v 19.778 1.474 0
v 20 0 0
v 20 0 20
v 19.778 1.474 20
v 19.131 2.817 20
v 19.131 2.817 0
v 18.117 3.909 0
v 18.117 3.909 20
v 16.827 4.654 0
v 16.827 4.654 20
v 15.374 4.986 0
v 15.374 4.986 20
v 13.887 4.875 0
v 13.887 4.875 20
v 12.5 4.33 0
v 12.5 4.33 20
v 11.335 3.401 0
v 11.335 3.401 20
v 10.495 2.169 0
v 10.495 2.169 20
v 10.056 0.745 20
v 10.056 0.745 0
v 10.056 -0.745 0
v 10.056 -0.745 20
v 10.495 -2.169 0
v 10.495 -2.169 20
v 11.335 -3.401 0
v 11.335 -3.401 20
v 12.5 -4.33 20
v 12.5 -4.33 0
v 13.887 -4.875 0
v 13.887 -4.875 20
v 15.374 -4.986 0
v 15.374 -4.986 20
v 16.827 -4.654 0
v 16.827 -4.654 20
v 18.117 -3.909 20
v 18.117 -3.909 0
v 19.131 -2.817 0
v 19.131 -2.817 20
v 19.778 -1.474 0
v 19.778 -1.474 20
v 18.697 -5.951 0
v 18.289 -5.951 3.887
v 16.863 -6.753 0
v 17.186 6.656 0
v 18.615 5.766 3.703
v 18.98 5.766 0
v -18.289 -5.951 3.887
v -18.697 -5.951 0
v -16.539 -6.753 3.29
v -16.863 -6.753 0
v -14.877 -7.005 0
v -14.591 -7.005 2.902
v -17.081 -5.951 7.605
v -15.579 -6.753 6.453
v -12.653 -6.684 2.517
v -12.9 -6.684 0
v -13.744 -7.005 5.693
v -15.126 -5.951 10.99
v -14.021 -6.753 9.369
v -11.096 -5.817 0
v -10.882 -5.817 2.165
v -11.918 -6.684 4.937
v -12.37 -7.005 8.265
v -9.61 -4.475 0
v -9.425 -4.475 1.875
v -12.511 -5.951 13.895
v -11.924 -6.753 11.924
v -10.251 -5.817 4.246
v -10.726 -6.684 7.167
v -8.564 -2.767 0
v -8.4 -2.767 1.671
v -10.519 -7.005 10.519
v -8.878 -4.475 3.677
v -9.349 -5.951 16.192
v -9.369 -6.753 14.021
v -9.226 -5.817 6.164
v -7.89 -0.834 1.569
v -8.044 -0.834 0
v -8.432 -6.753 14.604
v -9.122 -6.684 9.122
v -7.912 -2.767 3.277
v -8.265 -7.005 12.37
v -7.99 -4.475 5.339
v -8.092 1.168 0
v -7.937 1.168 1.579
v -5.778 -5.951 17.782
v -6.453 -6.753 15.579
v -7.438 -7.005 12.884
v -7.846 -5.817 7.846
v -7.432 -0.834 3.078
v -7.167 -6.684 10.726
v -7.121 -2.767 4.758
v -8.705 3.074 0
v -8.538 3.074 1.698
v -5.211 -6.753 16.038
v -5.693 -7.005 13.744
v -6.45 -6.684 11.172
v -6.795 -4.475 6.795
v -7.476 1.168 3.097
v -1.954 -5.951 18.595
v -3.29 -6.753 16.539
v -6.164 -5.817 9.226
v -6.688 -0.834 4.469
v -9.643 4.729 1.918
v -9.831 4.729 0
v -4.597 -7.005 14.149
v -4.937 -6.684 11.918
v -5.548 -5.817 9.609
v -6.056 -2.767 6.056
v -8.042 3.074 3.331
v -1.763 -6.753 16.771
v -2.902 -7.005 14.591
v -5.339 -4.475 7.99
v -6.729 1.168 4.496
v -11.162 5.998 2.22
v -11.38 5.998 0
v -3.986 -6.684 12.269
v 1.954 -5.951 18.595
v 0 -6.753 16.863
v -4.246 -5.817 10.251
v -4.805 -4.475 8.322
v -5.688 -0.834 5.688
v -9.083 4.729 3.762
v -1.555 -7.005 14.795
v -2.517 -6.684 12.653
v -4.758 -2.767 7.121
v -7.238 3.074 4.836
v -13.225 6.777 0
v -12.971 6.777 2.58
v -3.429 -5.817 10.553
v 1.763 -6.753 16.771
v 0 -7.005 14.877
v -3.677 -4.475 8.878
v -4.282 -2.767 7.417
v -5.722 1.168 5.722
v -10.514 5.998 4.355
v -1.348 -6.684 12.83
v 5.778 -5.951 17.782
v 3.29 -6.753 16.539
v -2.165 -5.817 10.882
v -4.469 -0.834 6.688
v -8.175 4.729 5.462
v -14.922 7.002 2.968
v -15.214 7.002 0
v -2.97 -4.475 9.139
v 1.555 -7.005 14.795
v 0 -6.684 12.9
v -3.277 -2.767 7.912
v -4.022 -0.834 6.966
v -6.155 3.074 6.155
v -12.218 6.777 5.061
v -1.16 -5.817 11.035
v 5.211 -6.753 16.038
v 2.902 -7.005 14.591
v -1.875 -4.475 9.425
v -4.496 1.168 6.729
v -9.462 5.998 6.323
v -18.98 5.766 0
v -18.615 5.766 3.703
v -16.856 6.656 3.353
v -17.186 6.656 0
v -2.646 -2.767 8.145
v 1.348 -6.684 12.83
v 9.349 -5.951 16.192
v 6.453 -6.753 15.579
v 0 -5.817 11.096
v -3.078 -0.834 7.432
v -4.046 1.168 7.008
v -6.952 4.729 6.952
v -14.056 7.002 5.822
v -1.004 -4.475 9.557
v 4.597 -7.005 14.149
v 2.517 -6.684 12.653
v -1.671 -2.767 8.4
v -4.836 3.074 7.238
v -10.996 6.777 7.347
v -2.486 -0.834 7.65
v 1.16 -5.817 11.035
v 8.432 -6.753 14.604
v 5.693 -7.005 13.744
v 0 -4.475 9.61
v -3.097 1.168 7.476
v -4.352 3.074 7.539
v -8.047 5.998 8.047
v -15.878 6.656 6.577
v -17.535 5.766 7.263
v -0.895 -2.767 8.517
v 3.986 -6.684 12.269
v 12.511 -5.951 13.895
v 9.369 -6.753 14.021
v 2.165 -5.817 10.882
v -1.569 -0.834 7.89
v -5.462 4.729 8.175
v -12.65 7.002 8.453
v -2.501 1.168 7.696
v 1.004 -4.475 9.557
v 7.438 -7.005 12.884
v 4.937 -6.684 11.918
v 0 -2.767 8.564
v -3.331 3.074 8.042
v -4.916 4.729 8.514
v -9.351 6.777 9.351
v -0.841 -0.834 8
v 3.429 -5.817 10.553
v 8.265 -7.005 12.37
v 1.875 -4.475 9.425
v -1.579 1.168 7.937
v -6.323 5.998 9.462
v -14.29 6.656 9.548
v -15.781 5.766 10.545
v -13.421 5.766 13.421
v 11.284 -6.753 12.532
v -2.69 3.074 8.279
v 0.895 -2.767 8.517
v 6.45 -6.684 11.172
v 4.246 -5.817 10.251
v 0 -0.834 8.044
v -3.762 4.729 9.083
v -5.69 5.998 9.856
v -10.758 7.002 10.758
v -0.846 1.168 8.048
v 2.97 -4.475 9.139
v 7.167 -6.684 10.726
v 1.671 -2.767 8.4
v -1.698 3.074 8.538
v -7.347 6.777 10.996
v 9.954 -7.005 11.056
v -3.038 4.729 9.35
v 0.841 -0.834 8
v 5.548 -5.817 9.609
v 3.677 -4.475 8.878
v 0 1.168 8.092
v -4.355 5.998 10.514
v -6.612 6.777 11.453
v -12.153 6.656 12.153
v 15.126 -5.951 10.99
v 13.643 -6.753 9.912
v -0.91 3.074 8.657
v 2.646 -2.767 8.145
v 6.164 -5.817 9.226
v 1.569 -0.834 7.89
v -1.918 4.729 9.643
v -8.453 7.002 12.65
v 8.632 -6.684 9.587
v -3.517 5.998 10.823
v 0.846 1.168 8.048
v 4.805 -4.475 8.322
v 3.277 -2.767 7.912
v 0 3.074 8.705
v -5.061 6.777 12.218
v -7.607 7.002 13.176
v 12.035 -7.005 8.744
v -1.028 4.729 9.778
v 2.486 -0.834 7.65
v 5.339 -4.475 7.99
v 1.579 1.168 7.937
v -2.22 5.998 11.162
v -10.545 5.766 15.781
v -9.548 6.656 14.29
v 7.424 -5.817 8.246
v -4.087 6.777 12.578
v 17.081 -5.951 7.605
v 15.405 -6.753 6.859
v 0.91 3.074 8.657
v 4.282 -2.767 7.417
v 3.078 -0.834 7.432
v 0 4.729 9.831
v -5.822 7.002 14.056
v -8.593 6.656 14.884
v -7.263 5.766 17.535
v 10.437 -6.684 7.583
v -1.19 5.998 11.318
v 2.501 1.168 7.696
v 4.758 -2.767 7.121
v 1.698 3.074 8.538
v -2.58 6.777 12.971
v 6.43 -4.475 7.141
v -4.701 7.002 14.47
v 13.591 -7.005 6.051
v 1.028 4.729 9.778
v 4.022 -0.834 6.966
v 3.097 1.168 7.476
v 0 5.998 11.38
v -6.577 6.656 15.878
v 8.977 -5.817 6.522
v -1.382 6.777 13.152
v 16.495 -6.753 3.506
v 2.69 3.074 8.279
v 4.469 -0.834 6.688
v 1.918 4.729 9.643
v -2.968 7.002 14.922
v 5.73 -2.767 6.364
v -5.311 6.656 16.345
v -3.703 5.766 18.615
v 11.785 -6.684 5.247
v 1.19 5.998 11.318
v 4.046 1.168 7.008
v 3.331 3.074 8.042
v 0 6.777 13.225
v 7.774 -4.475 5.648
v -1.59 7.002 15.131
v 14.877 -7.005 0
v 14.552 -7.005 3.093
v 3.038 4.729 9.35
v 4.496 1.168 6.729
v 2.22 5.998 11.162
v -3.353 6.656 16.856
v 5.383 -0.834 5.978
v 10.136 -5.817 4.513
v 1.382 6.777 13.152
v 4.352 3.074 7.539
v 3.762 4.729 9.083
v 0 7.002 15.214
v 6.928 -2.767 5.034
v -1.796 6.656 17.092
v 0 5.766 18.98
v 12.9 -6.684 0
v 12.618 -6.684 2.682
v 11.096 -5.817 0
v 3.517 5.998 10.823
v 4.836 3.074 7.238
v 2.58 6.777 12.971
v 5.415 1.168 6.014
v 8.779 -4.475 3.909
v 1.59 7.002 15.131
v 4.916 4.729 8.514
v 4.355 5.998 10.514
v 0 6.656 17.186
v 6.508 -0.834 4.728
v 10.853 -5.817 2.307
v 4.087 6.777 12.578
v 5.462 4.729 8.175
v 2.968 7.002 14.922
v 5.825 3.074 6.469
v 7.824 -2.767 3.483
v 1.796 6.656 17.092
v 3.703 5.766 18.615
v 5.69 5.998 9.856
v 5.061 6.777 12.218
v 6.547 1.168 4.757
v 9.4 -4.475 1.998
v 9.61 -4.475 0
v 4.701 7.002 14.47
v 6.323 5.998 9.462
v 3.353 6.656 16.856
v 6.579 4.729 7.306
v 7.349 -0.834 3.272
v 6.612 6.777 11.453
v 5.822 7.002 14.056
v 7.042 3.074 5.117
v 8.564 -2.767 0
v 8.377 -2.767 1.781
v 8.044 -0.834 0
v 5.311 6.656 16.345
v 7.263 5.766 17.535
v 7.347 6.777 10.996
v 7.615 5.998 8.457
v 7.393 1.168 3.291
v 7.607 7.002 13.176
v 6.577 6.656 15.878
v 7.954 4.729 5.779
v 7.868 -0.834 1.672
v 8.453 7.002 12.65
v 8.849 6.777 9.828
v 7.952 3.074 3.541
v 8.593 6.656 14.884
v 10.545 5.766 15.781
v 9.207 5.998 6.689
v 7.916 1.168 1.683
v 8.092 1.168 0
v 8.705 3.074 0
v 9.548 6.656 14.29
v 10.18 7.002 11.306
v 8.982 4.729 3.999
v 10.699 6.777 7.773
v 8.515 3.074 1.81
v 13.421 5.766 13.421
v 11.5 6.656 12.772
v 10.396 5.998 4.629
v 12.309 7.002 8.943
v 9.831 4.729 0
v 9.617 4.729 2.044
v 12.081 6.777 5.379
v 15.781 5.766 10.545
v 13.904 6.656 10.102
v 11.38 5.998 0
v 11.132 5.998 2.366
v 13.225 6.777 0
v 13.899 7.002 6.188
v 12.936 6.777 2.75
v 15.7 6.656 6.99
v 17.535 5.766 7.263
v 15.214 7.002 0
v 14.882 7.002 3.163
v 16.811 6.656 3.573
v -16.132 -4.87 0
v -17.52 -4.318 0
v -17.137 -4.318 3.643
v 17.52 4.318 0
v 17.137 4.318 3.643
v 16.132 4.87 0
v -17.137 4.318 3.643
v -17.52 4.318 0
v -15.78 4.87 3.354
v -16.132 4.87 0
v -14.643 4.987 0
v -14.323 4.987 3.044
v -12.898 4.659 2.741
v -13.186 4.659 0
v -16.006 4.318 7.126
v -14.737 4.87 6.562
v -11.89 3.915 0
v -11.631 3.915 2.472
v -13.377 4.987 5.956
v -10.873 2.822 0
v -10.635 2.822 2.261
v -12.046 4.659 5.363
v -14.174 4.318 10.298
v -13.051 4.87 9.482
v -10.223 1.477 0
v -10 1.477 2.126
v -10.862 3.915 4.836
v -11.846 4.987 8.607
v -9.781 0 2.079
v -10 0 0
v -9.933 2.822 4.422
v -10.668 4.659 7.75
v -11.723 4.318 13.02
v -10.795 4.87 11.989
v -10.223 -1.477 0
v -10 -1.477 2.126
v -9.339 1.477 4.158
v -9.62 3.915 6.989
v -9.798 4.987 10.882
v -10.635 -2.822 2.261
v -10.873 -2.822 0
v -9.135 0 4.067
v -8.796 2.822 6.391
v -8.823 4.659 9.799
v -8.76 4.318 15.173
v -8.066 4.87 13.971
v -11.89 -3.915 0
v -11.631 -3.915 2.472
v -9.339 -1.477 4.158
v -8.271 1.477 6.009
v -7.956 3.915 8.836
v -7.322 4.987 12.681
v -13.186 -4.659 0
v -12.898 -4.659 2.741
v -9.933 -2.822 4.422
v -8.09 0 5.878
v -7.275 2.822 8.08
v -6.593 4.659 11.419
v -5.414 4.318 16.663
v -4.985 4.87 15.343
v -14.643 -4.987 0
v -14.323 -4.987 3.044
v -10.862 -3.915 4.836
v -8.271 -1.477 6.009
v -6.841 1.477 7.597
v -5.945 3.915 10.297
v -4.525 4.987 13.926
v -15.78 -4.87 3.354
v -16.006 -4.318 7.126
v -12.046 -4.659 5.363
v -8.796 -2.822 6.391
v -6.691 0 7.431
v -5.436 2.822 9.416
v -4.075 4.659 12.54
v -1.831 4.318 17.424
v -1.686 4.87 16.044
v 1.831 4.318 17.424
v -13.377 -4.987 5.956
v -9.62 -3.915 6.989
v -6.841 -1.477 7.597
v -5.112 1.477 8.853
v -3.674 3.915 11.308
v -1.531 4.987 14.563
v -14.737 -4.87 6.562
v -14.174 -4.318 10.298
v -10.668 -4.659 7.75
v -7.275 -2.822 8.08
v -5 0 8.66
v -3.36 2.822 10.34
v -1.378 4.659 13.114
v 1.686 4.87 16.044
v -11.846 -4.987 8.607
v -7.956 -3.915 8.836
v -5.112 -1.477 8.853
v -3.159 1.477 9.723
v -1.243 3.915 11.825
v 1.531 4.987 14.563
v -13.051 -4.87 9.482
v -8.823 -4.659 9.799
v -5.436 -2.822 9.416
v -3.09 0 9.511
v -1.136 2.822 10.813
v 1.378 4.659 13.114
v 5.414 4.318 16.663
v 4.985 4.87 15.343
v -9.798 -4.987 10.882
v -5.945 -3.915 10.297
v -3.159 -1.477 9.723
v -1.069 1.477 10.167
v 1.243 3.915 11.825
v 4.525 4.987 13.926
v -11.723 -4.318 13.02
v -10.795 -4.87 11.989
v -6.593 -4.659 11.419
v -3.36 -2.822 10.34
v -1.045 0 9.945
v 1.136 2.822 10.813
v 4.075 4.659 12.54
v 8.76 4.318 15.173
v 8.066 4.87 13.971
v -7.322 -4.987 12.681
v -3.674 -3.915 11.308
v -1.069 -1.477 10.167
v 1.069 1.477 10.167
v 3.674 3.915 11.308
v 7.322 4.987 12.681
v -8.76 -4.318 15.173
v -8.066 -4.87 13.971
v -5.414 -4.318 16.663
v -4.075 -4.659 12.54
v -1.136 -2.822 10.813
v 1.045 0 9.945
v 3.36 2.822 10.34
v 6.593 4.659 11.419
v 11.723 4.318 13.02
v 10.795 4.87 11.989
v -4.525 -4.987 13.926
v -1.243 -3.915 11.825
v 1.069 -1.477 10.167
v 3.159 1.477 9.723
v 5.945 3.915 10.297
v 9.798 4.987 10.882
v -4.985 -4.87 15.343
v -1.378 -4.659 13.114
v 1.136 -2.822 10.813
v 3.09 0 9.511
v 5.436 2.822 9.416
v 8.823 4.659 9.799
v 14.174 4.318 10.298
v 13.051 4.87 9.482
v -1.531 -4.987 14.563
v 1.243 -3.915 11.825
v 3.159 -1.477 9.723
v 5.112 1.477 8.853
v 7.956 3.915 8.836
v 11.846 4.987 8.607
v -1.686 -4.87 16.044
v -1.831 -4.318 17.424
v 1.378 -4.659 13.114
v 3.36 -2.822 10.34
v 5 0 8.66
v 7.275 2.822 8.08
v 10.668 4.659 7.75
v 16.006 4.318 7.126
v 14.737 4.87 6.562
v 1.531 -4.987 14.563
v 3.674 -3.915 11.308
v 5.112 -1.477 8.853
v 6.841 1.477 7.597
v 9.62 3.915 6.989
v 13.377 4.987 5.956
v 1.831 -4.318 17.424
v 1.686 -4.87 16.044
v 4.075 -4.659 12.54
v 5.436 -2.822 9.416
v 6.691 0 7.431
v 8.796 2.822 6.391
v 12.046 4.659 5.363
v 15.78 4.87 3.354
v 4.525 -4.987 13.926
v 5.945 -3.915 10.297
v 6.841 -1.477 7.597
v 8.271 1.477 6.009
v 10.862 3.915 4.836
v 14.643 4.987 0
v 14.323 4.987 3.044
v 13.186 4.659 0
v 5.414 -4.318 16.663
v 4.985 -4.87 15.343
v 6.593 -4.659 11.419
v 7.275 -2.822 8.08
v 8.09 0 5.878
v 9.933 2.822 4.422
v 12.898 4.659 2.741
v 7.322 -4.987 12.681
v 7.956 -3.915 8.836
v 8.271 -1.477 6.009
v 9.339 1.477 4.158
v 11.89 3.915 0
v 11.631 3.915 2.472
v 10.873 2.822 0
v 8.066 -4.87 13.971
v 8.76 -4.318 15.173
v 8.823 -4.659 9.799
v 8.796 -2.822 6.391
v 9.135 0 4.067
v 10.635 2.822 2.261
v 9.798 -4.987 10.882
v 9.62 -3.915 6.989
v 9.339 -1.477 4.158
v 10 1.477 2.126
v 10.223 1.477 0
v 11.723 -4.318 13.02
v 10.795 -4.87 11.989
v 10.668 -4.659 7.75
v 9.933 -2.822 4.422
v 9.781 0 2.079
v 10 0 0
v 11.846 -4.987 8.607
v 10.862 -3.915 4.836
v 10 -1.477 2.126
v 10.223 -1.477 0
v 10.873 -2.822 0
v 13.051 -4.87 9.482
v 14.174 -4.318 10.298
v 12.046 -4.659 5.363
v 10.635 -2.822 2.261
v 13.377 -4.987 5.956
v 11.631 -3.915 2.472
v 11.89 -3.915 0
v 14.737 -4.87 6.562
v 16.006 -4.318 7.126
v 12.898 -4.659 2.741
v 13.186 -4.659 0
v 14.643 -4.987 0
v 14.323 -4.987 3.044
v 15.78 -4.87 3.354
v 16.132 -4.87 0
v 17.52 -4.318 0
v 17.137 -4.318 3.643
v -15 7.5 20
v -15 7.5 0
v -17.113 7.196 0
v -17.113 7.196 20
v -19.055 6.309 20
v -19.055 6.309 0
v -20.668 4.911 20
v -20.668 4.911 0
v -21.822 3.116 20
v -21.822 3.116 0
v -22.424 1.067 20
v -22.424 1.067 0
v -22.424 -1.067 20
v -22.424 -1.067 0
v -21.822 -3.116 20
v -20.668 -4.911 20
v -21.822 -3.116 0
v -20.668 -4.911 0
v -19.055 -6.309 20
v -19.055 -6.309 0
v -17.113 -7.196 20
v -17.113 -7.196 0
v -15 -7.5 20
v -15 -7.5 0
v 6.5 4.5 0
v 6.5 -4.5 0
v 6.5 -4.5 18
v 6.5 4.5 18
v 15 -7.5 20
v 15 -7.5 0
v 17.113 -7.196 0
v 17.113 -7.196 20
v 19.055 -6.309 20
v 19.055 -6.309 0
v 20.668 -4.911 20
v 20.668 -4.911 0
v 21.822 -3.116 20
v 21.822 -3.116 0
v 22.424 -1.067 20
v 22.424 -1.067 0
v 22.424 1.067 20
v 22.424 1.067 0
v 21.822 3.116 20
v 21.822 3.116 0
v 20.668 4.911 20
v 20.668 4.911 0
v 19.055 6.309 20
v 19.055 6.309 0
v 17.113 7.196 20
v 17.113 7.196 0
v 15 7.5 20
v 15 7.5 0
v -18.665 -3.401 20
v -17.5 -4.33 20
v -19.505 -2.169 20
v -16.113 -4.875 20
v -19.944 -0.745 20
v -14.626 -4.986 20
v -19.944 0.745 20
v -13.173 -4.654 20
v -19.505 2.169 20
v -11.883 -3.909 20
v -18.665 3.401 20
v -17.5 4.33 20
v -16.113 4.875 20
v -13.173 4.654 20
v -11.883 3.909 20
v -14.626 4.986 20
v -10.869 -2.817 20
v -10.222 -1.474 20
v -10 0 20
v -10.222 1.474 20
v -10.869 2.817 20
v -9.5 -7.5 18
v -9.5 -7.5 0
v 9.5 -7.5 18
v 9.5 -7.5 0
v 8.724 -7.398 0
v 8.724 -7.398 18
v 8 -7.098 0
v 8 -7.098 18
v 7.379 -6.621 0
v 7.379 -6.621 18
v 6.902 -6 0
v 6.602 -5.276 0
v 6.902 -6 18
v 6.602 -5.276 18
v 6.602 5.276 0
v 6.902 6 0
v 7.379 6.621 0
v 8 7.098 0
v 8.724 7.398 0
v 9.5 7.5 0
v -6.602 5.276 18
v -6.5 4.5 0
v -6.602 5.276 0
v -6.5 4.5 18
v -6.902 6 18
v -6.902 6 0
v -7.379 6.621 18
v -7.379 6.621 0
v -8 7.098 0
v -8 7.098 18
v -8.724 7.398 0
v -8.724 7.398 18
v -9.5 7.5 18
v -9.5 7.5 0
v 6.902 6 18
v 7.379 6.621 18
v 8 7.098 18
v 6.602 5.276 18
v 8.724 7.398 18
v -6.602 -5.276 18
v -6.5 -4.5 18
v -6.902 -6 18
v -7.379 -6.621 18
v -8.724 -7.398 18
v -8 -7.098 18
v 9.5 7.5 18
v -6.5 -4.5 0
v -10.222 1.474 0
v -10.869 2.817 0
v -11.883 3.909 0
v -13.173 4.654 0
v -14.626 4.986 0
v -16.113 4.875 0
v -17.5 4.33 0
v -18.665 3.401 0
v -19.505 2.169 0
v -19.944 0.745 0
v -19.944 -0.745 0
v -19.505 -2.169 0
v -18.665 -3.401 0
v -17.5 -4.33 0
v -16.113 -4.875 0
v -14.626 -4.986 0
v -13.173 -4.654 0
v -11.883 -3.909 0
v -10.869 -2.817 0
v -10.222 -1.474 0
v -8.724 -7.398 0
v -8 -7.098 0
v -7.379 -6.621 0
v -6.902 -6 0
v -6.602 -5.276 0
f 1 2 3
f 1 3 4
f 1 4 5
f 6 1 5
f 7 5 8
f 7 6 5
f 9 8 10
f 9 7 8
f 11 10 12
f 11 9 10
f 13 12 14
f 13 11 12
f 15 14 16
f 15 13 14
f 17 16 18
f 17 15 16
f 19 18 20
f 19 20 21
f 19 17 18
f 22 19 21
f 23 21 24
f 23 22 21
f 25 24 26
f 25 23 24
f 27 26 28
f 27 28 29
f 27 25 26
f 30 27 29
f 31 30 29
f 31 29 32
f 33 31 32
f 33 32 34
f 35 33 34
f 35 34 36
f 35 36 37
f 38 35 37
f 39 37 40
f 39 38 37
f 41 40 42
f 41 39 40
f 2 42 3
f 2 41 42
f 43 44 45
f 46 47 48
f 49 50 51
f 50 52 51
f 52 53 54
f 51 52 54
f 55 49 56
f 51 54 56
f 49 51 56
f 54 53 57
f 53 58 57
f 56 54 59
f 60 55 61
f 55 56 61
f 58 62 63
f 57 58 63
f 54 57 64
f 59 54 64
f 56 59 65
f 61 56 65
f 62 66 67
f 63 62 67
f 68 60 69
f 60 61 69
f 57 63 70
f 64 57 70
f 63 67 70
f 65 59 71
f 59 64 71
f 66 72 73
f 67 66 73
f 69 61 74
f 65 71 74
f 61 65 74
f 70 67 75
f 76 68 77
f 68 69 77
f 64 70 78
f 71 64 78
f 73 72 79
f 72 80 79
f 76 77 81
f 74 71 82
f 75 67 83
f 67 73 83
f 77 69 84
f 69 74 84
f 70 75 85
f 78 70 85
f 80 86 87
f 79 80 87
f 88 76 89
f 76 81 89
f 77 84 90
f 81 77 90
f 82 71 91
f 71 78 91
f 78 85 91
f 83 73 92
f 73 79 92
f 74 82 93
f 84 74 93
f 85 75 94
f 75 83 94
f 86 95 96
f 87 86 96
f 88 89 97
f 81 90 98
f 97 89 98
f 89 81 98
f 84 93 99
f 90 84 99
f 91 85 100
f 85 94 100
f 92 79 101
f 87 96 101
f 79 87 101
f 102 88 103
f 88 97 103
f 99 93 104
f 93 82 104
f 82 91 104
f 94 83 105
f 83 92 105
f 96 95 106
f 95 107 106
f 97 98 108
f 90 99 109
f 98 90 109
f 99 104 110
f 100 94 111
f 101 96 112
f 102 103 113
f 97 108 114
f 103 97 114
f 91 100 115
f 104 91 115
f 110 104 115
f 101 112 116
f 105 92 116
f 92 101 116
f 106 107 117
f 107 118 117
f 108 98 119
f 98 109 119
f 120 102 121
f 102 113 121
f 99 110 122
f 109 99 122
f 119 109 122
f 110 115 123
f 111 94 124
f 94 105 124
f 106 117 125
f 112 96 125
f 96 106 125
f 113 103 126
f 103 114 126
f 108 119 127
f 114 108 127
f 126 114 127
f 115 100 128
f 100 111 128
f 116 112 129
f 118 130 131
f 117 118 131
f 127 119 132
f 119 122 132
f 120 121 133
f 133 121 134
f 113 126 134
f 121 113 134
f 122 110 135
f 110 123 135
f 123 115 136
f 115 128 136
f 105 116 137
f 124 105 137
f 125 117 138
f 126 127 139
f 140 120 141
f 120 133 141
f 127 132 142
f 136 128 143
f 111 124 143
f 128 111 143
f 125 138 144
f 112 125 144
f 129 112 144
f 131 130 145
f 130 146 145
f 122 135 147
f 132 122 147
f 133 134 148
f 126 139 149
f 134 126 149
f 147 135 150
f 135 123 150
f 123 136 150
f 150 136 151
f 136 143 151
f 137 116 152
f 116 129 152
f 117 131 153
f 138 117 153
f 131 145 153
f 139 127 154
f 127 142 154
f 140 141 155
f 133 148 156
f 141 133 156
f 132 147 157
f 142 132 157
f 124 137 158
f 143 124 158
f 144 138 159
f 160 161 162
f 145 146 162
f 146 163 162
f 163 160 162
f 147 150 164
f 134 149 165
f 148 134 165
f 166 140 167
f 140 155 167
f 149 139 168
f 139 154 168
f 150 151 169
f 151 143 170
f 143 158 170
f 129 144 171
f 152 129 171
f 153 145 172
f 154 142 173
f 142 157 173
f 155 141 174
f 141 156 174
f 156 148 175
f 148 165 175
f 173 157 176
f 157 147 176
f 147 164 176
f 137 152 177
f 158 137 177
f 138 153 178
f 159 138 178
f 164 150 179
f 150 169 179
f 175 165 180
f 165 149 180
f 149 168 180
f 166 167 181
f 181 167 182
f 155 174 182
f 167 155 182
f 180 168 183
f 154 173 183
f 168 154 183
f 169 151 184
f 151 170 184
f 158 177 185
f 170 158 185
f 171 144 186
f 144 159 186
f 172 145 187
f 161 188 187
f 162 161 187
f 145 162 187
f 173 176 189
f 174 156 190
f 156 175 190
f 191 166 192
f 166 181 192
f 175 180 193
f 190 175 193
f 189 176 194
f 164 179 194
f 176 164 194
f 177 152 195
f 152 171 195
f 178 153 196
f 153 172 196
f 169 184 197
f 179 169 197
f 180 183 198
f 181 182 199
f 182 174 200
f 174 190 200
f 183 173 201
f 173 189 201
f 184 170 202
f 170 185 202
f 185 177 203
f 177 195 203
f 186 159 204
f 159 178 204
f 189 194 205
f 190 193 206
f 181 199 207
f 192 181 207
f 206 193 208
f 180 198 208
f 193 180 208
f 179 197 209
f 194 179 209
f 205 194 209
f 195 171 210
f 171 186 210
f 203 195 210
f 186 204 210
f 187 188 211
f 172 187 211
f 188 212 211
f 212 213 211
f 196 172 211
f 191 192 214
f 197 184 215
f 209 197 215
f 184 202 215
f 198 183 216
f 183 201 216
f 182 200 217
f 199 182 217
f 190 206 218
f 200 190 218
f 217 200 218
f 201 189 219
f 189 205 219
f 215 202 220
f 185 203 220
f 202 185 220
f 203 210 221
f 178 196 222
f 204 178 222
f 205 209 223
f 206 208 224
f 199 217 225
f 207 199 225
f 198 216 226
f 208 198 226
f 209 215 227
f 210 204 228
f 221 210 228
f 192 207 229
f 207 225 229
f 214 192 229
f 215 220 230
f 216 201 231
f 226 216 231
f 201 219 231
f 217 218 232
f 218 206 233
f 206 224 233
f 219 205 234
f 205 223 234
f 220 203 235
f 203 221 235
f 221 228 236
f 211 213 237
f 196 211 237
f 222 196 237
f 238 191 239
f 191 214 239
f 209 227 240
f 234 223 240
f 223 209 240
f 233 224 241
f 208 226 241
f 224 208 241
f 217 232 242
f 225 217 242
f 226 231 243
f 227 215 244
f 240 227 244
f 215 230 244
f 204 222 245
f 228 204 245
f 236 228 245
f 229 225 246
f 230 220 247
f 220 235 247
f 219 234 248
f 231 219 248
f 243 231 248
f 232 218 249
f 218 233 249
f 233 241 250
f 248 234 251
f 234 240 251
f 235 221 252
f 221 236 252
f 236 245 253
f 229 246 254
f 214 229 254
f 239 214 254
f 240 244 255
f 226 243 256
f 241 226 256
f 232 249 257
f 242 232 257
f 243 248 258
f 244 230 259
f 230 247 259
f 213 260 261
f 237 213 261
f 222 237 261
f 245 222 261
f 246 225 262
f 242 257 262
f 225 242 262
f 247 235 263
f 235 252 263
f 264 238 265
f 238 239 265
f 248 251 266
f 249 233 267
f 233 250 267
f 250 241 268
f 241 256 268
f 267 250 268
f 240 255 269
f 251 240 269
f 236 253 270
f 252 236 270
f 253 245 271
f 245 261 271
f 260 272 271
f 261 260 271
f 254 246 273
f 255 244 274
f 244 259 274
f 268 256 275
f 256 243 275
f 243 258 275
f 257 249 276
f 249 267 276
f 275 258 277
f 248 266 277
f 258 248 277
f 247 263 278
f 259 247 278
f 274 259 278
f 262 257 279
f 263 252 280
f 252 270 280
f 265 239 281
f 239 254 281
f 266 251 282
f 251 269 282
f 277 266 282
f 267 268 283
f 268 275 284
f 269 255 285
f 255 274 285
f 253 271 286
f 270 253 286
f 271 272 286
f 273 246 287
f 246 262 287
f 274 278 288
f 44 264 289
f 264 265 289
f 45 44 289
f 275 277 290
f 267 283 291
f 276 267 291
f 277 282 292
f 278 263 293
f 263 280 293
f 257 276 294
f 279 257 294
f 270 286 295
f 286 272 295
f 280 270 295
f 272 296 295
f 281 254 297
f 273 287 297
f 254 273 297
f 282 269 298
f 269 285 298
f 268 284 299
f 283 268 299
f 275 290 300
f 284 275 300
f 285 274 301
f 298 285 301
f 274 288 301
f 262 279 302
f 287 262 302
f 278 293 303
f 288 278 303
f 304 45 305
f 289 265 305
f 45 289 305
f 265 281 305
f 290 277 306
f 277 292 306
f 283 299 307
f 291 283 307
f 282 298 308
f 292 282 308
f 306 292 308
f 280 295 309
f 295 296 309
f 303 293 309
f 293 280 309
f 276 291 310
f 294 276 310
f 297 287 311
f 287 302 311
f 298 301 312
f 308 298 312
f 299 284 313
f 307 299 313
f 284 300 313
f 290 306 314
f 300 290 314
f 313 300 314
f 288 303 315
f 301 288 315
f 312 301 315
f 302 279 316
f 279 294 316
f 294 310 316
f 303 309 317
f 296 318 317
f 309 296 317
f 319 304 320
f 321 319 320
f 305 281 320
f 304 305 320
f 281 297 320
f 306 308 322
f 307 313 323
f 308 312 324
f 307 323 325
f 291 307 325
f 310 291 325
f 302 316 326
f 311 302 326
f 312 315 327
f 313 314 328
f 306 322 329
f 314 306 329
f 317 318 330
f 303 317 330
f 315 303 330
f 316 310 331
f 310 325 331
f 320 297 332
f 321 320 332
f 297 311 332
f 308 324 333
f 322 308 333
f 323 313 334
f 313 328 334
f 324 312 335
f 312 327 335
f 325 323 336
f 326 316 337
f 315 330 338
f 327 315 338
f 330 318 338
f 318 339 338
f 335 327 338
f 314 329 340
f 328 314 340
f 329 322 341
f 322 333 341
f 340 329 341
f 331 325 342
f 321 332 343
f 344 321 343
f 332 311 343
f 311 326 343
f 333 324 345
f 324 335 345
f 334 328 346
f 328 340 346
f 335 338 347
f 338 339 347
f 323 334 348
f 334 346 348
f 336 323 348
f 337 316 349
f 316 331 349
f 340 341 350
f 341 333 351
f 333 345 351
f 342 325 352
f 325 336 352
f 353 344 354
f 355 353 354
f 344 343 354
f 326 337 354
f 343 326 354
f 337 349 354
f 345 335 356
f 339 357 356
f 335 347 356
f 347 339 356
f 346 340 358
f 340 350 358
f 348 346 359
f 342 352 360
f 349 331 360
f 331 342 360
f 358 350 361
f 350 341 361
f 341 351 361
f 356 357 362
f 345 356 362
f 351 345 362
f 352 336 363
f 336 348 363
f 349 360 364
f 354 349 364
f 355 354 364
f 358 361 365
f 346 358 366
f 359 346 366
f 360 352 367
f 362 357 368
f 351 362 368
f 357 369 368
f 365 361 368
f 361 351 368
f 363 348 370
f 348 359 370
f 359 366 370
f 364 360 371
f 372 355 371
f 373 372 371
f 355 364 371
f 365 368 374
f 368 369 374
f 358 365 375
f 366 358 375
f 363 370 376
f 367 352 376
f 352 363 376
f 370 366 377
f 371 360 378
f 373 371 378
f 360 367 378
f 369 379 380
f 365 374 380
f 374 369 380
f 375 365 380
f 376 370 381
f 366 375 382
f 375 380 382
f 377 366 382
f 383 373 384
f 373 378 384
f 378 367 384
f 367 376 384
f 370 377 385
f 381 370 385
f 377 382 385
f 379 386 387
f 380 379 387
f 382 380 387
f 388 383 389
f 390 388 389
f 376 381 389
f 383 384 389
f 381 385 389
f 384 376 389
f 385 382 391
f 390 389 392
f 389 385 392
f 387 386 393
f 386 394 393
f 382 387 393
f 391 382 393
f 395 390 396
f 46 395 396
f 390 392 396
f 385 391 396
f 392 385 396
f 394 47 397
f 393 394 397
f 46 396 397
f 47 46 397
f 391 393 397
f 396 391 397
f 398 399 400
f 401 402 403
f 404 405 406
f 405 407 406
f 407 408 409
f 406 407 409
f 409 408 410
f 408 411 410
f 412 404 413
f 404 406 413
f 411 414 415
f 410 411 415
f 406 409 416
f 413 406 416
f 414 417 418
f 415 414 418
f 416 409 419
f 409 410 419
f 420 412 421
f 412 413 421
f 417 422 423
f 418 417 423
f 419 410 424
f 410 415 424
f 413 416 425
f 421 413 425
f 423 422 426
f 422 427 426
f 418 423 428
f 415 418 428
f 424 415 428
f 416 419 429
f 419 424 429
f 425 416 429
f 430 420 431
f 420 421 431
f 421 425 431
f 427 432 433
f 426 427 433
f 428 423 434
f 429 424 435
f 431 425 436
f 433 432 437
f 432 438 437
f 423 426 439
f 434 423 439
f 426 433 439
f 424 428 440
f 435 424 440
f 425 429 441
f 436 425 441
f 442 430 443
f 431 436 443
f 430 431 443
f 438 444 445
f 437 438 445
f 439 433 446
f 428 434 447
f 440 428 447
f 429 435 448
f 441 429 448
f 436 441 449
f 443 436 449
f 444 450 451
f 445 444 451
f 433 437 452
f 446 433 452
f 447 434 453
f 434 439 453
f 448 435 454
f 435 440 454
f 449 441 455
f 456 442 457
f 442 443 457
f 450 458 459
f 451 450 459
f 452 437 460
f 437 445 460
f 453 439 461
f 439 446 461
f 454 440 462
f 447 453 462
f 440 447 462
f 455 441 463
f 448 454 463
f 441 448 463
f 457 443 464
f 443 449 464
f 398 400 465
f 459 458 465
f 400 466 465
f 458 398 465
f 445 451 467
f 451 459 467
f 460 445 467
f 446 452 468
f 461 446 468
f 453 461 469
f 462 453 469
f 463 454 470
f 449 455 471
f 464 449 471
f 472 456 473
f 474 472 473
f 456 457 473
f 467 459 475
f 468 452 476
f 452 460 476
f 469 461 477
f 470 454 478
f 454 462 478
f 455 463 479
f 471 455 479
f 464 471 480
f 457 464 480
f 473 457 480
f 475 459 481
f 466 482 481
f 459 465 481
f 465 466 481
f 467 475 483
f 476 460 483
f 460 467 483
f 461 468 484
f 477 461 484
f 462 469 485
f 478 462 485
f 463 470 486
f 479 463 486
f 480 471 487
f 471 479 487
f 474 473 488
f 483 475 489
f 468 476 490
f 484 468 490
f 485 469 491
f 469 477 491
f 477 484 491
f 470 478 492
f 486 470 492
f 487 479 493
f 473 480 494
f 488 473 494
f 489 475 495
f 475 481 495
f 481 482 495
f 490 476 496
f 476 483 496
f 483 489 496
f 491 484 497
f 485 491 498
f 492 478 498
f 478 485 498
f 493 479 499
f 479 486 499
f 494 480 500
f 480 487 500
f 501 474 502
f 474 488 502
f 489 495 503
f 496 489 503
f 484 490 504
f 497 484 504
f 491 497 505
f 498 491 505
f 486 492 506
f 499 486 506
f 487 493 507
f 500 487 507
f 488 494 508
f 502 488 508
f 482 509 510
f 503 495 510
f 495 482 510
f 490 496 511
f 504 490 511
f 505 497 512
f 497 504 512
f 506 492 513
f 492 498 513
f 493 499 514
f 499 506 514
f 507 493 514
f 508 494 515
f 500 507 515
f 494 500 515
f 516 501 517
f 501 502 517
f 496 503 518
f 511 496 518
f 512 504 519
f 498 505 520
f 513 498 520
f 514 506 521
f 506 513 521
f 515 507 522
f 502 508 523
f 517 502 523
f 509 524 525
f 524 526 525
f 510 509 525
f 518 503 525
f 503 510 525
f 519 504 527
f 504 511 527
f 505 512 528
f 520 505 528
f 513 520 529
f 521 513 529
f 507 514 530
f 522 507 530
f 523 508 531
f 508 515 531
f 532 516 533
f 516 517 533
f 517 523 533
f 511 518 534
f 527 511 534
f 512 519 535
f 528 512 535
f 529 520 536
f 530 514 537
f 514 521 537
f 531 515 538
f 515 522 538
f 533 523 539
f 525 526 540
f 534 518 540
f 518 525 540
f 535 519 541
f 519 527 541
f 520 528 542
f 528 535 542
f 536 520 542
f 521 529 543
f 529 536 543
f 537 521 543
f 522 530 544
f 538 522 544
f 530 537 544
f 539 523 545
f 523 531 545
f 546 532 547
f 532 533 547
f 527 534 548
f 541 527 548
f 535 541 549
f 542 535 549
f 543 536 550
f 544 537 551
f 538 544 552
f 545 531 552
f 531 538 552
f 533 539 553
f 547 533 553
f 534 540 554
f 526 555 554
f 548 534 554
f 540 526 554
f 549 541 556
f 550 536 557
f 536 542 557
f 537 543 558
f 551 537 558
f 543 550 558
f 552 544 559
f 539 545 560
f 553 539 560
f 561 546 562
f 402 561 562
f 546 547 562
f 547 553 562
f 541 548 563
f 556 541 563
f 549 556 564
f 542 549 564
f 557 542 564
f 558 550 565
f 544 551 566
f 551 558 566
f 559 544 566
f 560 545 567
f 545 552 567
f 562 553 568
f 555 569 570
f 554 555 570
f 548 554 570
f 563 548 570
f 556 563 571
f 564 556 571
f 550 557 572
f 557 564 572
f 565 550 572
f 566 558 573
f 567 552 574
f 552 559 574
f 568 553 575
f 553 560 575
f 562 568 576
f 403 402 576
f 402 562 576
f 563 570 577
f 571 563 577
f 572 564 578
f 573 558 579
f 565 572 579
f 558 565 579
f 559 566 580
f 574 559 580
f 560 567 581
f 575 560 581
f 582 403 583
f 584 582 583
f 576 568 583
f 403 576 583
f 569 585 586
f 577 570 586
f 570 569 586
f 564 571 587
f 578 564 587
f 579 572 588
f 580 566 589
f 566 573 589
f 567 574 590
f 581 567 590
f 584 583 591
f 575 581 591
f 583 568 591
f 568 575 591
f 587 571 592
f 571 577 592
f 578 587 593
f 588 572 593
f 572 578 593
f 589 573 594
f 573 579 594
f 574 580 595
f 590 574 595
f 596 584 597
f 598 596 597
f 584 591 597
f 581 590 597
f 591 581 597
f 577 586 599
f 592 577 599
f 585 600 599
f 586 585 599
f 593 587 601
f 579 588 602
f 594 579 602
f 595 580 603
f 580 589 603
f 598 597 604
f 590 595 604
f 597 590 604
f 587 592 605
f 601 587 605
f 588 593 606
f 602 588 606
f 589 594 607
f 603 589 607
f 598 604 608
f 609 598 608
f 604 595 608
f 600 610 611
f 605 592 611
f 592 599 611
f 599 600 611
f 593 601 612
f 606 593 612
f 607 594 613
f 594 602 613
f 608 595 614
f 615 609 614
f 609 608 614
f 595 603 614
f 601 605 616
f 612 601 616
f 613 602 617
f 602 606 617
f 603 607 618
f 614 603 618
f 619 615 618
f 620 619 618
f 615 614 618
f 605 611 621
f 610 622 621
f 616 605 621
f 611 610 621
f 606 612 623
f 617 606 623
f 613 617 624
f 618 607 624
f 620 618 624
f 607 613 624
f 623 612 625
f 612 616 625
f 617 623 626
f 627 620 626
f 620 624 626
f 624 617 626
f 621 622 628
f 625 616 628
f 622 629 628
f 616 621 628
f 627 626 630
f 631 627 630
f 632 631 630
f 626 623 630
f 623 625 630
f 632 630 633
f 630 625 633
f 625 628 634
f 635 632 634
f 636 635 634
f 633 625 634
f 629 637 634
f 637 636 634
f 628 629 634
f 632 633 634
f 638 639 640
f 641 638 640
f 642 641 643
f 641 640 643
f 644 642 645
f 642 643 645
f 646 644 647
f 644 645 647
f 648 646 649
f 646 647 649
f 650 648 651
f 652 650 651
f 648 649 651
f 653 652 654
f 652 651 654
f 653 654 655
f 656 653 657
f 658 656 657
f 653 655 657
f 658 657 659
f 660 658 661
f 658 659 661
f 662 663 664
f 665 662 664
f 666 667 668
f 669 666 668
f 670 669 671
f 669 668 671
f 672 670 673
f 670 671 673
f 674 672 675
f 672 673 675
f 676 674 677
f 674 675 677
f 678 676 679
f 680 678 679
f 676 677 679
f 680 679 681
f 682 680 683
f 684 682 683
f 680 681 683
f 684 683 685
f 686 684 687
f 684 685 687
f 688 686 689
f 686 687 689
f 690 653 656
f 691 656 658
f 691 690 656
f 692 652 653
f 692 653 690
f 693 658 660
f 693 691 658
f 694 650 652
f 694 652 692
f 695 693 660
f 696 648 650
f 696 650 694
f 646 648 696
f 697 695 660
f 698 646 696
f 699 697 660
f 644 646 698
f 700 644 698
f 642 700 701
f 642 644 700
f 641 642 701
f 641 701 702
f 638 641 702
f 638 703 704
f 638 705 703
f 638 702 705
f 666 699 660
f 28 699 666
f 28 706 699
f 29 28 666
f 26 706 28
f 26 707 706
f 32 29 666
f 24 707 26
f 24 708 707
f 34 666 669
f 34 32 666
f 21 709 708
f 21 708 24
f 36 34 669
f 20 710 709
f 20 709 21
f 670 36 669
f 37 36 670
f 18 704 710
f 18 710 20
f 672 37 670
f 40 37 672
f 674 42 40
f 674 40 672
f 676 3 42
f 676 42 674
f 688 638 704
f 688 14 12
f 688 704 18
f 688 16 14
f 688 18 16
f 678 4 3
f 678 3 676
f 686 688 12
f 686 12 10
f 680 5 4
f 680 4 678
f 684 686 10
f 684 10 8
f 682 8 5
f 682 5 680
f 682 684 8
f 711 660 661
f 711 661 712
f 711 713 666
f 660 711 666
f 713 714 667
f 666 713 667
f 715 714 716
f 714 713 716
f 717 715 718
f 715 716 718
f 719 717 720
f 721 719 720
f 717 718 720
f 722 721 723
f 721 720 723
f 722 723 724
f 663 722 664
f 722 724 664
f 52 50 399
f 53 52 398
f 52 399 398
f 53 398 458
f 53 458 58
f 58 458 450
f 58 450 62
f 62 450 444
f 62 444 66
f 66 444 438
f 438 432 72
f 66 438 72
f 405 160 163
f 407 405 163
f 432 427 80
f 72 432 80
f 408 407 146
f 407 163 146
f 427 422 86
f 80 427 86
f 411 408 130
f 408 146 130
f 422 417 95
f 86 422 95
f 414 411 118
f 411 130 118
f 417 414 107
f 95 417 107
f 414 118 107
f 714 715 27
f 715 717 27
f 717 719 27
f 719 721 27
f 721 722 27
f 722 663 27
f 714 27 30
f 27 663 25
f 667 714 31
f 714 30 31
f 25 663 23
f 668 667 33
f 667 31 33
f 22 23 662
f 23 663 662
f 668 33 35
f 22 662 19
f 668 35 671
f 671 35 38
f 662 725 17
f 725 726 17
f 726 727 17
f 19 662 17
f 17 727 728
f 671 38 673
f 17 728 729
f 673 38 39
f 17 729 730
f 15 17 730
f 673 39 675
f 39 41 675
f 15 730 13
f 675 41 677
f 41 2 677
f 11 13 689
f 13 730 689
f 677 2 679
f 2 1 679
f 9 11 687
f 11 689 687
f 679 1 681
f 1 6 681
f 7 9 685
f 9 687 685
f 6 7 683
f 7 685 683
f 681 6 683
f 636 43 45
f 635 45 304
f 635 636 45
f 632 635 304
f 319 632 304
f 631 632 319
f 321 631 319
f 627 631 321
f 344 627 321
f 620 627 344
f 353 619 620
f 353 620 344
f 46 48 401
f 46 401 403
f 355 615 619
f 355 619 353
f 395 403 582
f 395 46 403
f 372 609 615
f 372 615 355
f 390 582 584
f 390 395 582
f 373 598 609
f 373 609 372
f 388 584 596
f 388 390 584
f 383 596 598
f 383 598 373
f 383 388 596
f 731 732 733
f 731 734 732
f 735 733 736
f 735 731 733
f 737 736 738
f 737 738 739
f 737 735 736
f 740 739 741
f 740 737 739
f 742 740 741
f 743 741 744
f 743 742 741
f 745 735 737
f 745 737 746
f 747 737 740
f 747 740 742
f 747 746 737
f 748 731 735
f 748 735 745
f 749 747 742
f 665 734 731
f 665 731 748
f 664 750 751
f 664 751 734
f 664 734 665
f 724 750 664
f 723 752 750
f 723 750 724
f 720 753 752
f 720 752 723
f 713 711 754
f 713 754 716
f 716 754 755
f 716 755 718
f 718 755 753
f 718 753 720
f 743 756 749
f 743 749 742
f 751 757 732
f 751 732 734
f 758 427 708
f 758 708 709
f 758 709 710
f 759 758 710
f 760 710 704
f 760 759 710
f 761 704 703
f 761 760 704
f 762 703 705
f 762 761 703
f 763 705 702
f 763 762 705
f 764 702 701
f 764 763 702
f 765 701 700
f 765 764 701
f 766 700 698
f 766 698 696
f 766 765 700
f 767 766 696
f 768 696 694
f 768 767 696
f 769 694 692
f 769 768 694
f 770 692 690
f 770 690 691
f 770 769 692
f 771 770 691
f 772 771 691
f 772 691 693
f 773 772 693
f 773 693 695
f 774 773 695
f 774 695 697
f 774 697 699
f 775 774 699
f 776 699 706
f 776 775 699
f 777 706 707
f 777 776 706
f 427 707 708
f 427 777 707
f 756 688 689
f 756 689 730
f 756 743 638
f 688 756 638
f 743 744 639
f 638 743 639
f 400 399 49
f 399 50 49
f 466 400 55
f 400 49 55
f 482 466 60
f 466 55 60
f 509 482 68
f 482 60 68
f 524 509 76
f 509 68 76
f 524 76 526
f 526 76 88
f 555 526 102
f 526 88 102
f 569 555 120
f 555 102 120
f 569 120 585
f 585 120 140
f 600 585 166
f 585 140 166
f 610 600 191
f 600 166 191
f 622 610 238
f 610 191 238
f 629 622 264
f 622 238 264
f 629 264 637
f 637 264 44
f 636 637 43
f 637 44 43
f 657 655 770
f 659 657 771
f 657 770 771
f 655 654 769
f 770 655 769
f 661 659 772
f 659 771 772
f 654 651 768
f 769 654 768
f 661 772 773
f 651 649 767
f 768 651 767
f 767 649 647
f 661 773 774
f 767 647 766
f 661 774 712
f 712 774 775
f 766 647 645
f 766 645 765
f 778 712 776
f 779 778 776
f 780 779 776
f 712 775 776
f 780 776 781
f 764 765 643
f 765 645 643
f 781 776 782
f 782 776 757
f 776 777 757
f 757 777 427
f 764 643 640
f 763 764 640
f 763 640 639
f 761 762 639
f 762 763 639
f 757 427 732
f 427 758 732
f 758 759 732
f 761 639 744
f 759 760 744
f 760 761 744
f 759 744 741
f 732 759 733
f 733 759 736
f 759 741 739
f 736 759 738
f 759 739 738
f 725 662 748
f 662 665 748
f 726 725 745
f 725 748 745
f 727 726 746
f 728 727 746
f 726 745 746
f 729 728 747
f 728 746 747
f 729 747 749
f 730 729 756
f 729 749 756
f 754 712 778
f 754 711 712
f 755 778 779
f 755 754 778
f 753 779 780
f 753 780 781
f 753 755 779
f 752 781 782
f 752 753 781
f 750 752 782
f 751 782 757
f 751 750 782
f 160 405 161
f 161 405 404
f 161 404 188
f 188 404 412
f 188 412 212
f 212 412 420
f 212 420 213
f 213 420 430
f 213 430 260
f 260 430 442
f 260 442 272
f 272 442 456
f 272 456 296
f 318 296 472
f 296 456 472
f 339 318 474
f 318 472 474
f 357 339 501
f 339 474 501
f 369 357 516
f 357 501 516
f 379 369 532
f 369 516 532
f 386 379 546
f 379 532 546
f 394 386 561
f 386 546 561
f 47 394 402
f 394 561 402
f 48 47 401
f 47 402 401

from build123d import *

# Parameters (mm, degrees)
F0_R     = 5
F1_DEPTH = 20
F3_ANGLE = 180
F4_W     = 13
F4_H     = 18
F5_DEPTH = 25
F6_R     = 3


with BuildPart() as f1:
    # F0 (on Top) → F1 (new body)
    with BuildSketch(Plane.XY):
        with BuildLine():
            ThreePointArc((-15, 7.5), (-9.6966991411, 5.3033008589), (-7.5, 0))
            ThreePointArc((-7.5, 0), (-9.6966991411, -5.3033008589), (-15, -7.5))
            Line((-15, -7.5), (0, -7.5))
            Line((0, -7.5), (5, -7.5))
            Line((5, -7.5), (15, -7.5))
            ThreePointArc((15, -7.5), (7.5, 0), (15, 7.5))
            Line((15, 7.5), (0, 7.5))
            Line((0, 7.5), (-15, 7.5))
        make_face()
        with BuildLine():
            ThreePointArc((-15, -7.5), (-9.6966991411, -5.3033008589), (-7.5, 0))
            ThreePointArc((-7.5, 0), (-9.6966991411, 5.3033008589), (-15, 7.5))
            ThreePointArc((-15, 7.5), (-22.5, 0), (-15, -7.5))
        make_face()
        with Locations((-15, 0)):
            Circle(F0_R, mode=Mode.SUBTRACT)
        with BuildLine():
            ThreePointArc((22.5, 0), (20.3033008589, 5.3033008589), (15, 7.5))
            ThreePointArc((15, 7.5), (7.5, 0), (15, -7.5))
            ThreePointArc((15, -7.5), (20.3033008589, -5.3033008589), (22.5, 0))
        make_face()
        with Locations((15, 0)):
            Circle(F0_R, mode=Mode.SUBTRACT)
    extrude(amount=F1_DEPTH)

    # F4 (on face) → F5 (cut)
    with BuildSketch(Plane.XZ.offset(7.5)):
        with Locations((0, 9)):
            Rectangle(F4_W, F4_H)
    extrude(amount=-F5_DEPTH, mode=Mode.SUBTRACT)

    # F6
    f6_edges = [f1.edges().sort_by_distance(p)[0] for p in [
        (-6.5, -7.5, 9),
        (-6.5, 7.5, 9),
        (6.5, 7.5, 9),
        (6.5, -7.5, 9),
    ]]
    fillet(f6_edges, radius=F6_R)


with BuildPart() as f3:
    # F2 (on Top) → F3 (revolve)
    with BuildSketch(Plane.XY):
        with BuildLine():
            Line((-17.5202840718, -4.3183524865), (-18.6972782109, -5.9505544354))
            ThreePointArc((-18.6972782109, -5.9505544354), (-7.9963954846, 0.1687840342), (-18.9796314418, 5.7655440199))
            Line((-18.9796314418, 5.7655440199), (-17.5202840718, 4.3183524865))
            ThreePointArc((-17.5202840718, 4.3183524865), (-10, 0), (-17.5202840718, -4.3183524865))
        make_face()
    revolve(axis=Axis((0, 4.9783602892, 0), (0, 1, 0)), revolution_arc=F3_ANGLE)


solid = Compound([f1.part, f3.part])
